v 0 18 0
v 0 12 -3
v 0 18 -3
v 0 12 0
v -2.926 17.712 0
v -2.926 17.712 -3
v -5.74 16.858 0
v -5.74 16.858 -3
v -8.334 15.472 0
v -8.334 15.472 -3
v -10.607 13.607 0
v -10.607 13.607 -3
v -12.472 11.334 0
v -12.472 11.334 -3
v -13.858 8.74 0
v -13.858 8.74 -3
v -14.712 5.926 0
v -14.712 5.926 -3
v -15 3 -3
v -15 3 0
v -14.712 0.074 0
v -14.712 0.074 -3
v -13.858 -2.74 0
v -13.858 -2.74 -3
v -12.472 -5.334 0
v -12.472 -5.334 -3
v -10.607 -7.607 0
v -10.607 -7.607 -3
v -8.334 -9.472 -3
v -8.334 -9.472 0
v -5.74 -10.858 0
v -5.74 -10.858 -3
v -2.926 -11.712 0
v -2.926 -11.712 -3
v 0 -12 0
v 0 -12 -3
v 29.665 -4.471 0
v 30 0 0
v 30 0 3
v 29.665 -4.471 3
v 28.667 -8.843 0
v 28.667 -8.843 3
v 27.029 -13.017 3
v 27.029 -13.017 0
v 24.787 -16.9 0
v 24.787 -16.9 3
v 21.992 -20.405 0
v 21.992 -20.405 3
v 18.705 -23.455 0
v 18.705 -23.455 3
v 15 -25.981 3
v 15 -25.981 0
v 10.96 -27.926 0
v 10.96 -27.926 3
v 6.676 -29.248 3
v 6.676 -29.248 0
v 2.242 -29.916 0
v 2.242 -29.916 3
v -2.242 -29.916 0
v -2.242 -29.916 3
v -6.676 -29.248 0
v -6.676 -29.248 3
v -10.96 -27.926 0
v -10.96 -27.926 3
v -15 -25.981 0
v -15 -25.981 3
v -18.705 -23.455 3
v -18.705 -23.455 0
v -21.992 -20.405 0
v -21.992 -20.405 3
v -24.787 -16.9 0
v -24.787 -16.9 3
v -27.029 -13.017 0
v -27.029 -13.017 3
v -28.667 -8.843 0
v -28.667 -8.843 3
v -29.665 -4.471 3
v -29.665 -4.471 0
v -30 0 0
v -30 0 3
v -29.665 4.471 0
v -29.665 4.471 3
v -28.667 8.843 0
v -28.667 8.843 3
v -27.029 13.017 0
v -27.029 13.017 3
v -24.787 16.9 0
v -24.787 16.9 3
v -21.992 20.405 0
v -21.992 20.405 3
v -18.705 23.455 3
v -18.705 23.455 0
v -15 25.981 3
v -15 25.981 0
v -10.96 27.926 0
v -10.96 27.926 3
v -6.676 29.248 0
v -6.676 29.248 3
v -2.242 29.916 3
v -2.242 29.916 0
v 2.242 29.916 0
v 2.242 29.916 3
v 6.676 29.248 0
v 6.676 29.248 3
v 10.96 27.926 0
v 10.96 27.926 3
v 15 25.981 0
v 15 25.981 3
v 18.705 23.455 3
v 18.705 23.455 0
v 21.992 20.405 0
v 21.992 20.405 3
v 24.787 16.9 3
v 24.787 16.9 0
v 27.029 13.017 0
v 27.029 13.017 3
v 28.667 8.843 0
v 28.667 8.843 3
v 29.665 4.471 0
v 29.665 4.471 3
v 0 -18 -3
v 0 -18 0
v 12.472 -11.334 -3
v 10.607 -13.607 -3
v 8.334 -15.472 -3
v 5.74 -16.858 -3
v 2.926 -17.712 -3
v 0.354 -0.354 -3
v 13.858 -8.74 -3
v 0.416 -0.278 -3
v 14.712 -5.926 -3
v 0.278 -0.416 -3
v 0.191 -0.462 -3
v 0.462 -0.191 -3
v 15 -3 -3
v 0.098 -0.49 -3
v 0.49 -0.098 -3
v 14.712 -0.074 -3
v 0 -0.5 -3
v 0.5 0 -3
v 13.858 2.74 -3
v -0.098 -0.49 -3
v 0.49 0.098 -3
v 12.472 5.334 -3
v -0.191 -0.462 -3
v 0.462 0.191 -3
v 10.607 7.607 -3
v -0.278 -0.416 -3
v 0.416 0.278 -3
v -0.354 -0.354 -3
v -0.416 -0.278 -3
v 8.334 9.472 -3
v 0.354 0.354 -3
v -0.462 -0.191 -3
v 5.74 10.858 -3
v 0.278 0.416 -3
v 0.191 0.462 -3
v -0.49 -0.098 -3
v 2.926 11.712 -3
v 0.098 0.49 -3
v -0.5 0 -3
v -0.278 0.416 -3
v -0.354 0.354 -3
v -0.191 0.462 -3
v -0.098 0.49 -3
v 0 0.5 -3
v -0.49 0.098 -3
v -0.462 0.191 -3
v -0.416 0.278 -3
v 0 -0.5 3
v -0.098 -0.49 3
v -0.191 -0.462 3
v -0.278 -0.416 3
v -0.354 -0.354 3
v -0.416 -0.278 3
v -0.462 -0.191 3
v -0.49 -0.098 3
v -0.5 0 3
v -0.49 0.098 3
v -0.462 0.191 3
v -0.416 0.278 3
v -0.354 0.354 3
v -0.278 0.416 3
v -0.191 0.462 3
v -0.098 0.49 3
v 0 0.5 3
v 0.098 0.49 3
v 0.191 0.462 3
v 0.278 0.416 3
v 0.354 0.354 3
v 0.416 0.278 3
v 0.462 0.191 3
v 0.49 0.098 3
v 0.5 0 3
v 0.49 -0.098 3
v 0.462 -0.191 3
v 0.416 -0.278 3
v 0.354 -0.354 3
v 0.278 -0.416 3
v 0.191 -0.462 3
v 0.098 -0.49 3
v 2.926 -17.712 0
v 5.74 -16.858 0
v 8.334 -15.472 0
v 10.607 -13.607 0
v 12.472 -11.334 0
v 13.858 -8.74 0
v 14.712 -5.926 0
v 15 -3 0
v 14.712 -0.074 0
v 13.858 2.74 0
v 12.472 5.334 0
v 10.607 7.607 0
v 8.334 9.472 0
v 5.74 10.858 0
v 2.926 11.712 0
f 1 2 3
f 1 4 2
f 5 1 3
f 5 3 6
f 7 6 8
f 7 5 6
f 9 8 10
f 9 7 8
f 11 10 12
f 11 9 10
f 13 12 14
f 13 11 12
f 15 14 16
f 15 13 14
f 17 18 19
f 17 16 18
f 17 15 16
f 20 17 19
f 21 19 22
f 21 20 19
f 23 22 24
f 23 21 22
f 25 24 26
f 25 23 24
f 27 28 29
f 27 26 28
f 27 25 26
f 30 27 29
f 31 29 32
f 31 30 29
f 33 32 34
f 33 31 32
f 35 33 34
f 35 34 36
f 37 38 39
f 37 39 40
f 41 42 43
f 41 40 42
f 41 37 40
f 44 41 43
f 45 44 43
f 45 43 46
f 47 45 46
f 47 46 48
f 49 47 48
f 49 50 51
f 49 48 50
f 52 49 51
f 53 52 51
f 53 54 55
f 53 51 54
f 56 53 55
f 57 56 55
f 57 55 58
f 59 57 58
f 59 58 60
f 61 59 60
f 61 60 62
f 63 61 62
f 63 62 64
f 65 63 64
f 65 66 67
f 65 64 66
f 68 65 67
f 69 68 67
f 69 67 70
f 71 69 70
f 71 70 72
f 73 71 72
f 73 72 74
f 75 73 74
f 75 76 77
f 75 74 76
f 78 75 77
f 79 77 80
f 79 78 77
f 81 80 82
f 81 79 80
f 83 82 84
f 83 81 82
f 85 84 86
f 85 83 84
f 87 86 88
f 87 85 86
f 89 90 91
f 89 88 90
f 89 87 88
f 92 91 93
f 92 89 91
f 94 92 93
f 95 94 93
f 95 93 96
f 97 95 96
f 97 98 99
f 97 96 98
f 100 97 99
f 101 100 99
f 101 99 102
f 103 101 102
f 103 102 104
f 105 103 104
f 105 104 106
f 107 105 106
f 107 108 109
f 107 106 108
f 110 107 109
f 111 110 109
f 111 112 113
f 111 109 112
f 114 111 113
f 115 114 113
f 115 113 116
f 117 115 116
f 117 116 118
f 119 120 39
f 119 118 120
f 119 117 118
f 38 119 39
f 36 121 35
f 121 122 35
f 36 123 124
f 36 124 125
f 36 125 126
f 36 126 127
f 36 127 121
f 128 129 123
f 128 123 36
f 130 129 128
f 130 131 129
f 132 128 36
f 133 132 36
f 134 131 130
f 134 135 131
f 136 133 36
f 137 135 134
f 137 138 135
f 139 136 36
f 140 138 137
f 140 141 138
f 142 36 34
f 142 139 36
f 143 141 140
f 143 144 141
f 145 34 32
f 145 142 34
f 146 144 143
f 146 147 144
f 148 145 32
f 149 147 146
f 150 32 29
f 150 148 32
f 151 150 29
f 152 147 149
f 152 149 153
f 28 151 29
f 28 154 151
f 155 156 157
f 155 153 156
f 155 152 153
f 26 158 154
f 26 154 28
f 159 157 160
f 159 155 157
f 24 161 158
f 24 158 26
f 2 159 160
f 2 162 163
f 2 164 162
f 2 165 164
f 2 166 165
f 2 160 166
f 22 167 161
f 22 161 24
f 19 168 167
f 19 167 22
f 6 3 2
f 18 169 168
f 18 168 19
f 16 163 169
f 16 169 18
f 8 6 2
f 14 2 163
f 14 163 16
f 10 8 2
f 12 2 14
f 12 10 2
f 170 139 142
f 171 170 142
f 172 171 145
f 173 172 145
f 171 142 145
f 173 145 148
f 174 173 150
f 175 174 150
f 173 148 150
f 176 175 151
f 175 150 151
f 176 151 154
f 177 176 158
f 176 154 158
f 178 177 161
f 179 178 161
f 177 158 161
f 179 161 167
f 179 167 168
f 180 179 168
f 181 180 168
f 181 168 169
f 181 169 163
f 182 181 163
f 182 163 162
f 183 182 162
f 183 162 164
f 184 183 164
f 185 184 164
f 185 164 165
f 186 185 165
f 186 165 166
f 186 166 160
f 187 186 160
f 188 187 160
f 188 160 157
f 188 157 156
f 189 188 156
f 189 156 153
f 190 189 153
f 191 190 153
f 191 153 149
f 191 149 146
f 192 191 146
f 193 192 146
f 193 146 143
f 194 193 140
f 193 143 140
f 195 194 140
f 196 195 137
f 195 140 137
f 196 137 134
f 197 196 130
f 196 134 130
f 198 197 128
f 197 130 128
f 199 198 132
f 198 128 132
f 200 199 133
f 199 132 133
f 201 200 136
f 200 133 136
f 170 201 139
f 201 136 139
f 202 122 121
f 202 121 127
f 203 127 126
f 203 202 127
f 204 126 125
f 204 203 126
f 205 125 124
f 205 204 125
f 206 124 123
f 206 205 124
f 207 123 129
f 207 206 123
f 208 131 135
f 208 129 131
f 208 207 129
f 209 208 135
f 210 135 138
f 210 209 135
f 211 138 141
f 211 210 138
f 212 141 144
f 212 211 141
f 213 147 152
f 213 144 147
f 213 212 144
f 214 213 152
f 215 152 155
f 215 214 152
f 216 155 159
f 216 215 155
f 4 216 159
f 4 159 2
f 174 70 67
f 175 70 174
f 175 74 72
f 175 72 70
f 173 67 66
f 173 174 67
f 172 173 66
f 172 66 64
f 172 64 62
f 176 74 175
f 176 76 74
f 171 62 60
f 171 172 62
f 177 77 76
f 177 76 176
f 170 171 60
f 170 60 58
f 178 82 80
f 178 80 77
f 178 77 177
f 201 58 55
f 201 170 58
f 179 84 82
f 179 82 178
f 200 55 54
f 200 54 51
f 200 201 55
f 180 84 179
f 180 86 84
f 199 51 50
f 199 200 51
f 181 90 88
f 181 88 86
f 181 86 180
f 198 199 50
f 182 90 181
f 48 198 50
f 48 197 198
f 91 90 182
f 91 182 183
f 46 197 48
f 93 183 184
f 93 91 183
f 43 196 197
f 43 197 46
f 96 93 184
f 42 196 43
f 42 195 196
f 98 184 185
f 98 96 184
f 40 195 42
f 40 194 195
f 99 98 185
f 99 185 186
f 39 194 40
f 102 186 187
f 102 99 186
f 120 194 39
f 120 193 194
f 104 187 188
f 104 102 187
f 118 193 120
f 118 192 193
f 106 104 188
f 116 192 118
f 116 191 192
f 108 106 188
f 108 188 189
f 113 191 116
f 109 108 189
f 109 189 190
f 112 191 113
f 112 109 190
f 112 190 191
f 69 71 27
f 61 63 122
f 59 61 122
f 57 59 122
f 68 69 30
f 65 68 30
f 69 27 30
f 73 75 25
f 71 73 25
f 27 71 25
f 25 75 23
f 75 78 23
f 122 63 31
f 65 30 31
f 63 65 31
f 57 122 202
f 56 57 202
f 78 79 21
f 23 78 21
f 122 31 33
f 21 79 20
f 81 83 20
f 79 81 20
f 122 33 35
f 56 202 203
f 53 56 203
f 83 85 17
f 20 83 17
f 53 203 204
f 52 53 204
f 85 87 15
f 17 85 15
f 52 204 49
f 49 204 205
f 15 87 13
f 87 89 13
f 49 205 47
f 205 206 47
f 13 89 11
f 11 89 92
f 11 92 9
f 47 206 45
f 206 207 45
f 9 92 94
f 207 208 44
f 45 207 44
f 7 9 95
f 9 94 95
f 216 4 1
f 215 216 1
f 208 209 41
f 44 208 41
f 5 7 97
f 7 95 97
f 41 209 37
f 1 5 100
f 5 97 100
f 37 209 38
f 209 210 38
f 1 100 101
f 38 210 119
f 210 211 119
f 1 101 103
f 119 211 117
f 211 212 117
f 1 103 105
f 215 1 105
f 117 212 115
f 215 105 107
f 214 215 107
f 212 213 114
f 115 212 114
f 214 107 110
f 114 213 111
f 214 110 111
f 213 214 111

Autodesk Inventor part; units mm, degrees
ref_plane "YZ Plane" through (0, 0, 0) normal (1, 0, 0) x (0, 1, 0)
ref_plane "XZ Plane" through (0, 0, 0) normal (0, 1, 0) x (-1, 0, 0)
ref_plane "XY Plane" through (0, 0, 0) normal (0, 0, 1) x (1, 0, 0)
sketch "Sketch1" plane through (0, 0, 0) normal (0, 0, 1) x (1, 0, 0)
  circle A0 centre (0, 0) radius 30
  dimension "d0" = 60
extrude "Extrusion1" add sketch "Sketch1" along normal blind 3
sketch "Sketch2" plane through (0, 0, 0) normal (0, 0, -1) x (-1, 0, 0)
  arc A0 (0, 12) -> (0, -18) centre (0, -3) ccw
  arc A1 (0, -12) -> (0, 18) centre (0, 3) ccw
  circle A2 centre (0, 0) radius 30 projected
  line L0 (0, -18) -> (0, -12)
  line L1 (0, 12) -> (0, 18)
  dimension "d3" = 15
  dimension "d5" = 3
  dimension "d6" = 3
extrude "Extrusion2" add sketch "Sketch2" along normal blind 3 contours L1 A1 L0 A0
sketch "Sketch3" plane through (0, 0, 3) normal (0, 0, 1) x (1, 0, 0)
  point P0 (0, 0)
  point P1 (0, 0)
hole "Hole1" at (0, 0, 3) direction (0, 0, -1) diameter 1 end through all
equation "\"d0\" = rs_diametro"
equation "\"d1\" = rs_grosor"
equation "\"d3\" = 0.5 * rs_gancho_diametro"
equation "\"d5\" = rs_gancho_diente"
equation "\"d6\" = rs_gancho_diente"
equation "\"d7\" = rs_gancho_grosor"
equation "\"d9\" = ri_ancla_diametro"
equation "\"rs_diametro\" = 60"
equation "\"rs_grosor\" = 3"
equation "\"rs_gancho_diametro\" = 30"
equation "\"rs_gancho_grosor\" = 3"
equation "\"ri_ancla_diametro\" = 1"
equation "\"rs_gancho_diente\" = 3"
properties part number "Rueda Superior"
